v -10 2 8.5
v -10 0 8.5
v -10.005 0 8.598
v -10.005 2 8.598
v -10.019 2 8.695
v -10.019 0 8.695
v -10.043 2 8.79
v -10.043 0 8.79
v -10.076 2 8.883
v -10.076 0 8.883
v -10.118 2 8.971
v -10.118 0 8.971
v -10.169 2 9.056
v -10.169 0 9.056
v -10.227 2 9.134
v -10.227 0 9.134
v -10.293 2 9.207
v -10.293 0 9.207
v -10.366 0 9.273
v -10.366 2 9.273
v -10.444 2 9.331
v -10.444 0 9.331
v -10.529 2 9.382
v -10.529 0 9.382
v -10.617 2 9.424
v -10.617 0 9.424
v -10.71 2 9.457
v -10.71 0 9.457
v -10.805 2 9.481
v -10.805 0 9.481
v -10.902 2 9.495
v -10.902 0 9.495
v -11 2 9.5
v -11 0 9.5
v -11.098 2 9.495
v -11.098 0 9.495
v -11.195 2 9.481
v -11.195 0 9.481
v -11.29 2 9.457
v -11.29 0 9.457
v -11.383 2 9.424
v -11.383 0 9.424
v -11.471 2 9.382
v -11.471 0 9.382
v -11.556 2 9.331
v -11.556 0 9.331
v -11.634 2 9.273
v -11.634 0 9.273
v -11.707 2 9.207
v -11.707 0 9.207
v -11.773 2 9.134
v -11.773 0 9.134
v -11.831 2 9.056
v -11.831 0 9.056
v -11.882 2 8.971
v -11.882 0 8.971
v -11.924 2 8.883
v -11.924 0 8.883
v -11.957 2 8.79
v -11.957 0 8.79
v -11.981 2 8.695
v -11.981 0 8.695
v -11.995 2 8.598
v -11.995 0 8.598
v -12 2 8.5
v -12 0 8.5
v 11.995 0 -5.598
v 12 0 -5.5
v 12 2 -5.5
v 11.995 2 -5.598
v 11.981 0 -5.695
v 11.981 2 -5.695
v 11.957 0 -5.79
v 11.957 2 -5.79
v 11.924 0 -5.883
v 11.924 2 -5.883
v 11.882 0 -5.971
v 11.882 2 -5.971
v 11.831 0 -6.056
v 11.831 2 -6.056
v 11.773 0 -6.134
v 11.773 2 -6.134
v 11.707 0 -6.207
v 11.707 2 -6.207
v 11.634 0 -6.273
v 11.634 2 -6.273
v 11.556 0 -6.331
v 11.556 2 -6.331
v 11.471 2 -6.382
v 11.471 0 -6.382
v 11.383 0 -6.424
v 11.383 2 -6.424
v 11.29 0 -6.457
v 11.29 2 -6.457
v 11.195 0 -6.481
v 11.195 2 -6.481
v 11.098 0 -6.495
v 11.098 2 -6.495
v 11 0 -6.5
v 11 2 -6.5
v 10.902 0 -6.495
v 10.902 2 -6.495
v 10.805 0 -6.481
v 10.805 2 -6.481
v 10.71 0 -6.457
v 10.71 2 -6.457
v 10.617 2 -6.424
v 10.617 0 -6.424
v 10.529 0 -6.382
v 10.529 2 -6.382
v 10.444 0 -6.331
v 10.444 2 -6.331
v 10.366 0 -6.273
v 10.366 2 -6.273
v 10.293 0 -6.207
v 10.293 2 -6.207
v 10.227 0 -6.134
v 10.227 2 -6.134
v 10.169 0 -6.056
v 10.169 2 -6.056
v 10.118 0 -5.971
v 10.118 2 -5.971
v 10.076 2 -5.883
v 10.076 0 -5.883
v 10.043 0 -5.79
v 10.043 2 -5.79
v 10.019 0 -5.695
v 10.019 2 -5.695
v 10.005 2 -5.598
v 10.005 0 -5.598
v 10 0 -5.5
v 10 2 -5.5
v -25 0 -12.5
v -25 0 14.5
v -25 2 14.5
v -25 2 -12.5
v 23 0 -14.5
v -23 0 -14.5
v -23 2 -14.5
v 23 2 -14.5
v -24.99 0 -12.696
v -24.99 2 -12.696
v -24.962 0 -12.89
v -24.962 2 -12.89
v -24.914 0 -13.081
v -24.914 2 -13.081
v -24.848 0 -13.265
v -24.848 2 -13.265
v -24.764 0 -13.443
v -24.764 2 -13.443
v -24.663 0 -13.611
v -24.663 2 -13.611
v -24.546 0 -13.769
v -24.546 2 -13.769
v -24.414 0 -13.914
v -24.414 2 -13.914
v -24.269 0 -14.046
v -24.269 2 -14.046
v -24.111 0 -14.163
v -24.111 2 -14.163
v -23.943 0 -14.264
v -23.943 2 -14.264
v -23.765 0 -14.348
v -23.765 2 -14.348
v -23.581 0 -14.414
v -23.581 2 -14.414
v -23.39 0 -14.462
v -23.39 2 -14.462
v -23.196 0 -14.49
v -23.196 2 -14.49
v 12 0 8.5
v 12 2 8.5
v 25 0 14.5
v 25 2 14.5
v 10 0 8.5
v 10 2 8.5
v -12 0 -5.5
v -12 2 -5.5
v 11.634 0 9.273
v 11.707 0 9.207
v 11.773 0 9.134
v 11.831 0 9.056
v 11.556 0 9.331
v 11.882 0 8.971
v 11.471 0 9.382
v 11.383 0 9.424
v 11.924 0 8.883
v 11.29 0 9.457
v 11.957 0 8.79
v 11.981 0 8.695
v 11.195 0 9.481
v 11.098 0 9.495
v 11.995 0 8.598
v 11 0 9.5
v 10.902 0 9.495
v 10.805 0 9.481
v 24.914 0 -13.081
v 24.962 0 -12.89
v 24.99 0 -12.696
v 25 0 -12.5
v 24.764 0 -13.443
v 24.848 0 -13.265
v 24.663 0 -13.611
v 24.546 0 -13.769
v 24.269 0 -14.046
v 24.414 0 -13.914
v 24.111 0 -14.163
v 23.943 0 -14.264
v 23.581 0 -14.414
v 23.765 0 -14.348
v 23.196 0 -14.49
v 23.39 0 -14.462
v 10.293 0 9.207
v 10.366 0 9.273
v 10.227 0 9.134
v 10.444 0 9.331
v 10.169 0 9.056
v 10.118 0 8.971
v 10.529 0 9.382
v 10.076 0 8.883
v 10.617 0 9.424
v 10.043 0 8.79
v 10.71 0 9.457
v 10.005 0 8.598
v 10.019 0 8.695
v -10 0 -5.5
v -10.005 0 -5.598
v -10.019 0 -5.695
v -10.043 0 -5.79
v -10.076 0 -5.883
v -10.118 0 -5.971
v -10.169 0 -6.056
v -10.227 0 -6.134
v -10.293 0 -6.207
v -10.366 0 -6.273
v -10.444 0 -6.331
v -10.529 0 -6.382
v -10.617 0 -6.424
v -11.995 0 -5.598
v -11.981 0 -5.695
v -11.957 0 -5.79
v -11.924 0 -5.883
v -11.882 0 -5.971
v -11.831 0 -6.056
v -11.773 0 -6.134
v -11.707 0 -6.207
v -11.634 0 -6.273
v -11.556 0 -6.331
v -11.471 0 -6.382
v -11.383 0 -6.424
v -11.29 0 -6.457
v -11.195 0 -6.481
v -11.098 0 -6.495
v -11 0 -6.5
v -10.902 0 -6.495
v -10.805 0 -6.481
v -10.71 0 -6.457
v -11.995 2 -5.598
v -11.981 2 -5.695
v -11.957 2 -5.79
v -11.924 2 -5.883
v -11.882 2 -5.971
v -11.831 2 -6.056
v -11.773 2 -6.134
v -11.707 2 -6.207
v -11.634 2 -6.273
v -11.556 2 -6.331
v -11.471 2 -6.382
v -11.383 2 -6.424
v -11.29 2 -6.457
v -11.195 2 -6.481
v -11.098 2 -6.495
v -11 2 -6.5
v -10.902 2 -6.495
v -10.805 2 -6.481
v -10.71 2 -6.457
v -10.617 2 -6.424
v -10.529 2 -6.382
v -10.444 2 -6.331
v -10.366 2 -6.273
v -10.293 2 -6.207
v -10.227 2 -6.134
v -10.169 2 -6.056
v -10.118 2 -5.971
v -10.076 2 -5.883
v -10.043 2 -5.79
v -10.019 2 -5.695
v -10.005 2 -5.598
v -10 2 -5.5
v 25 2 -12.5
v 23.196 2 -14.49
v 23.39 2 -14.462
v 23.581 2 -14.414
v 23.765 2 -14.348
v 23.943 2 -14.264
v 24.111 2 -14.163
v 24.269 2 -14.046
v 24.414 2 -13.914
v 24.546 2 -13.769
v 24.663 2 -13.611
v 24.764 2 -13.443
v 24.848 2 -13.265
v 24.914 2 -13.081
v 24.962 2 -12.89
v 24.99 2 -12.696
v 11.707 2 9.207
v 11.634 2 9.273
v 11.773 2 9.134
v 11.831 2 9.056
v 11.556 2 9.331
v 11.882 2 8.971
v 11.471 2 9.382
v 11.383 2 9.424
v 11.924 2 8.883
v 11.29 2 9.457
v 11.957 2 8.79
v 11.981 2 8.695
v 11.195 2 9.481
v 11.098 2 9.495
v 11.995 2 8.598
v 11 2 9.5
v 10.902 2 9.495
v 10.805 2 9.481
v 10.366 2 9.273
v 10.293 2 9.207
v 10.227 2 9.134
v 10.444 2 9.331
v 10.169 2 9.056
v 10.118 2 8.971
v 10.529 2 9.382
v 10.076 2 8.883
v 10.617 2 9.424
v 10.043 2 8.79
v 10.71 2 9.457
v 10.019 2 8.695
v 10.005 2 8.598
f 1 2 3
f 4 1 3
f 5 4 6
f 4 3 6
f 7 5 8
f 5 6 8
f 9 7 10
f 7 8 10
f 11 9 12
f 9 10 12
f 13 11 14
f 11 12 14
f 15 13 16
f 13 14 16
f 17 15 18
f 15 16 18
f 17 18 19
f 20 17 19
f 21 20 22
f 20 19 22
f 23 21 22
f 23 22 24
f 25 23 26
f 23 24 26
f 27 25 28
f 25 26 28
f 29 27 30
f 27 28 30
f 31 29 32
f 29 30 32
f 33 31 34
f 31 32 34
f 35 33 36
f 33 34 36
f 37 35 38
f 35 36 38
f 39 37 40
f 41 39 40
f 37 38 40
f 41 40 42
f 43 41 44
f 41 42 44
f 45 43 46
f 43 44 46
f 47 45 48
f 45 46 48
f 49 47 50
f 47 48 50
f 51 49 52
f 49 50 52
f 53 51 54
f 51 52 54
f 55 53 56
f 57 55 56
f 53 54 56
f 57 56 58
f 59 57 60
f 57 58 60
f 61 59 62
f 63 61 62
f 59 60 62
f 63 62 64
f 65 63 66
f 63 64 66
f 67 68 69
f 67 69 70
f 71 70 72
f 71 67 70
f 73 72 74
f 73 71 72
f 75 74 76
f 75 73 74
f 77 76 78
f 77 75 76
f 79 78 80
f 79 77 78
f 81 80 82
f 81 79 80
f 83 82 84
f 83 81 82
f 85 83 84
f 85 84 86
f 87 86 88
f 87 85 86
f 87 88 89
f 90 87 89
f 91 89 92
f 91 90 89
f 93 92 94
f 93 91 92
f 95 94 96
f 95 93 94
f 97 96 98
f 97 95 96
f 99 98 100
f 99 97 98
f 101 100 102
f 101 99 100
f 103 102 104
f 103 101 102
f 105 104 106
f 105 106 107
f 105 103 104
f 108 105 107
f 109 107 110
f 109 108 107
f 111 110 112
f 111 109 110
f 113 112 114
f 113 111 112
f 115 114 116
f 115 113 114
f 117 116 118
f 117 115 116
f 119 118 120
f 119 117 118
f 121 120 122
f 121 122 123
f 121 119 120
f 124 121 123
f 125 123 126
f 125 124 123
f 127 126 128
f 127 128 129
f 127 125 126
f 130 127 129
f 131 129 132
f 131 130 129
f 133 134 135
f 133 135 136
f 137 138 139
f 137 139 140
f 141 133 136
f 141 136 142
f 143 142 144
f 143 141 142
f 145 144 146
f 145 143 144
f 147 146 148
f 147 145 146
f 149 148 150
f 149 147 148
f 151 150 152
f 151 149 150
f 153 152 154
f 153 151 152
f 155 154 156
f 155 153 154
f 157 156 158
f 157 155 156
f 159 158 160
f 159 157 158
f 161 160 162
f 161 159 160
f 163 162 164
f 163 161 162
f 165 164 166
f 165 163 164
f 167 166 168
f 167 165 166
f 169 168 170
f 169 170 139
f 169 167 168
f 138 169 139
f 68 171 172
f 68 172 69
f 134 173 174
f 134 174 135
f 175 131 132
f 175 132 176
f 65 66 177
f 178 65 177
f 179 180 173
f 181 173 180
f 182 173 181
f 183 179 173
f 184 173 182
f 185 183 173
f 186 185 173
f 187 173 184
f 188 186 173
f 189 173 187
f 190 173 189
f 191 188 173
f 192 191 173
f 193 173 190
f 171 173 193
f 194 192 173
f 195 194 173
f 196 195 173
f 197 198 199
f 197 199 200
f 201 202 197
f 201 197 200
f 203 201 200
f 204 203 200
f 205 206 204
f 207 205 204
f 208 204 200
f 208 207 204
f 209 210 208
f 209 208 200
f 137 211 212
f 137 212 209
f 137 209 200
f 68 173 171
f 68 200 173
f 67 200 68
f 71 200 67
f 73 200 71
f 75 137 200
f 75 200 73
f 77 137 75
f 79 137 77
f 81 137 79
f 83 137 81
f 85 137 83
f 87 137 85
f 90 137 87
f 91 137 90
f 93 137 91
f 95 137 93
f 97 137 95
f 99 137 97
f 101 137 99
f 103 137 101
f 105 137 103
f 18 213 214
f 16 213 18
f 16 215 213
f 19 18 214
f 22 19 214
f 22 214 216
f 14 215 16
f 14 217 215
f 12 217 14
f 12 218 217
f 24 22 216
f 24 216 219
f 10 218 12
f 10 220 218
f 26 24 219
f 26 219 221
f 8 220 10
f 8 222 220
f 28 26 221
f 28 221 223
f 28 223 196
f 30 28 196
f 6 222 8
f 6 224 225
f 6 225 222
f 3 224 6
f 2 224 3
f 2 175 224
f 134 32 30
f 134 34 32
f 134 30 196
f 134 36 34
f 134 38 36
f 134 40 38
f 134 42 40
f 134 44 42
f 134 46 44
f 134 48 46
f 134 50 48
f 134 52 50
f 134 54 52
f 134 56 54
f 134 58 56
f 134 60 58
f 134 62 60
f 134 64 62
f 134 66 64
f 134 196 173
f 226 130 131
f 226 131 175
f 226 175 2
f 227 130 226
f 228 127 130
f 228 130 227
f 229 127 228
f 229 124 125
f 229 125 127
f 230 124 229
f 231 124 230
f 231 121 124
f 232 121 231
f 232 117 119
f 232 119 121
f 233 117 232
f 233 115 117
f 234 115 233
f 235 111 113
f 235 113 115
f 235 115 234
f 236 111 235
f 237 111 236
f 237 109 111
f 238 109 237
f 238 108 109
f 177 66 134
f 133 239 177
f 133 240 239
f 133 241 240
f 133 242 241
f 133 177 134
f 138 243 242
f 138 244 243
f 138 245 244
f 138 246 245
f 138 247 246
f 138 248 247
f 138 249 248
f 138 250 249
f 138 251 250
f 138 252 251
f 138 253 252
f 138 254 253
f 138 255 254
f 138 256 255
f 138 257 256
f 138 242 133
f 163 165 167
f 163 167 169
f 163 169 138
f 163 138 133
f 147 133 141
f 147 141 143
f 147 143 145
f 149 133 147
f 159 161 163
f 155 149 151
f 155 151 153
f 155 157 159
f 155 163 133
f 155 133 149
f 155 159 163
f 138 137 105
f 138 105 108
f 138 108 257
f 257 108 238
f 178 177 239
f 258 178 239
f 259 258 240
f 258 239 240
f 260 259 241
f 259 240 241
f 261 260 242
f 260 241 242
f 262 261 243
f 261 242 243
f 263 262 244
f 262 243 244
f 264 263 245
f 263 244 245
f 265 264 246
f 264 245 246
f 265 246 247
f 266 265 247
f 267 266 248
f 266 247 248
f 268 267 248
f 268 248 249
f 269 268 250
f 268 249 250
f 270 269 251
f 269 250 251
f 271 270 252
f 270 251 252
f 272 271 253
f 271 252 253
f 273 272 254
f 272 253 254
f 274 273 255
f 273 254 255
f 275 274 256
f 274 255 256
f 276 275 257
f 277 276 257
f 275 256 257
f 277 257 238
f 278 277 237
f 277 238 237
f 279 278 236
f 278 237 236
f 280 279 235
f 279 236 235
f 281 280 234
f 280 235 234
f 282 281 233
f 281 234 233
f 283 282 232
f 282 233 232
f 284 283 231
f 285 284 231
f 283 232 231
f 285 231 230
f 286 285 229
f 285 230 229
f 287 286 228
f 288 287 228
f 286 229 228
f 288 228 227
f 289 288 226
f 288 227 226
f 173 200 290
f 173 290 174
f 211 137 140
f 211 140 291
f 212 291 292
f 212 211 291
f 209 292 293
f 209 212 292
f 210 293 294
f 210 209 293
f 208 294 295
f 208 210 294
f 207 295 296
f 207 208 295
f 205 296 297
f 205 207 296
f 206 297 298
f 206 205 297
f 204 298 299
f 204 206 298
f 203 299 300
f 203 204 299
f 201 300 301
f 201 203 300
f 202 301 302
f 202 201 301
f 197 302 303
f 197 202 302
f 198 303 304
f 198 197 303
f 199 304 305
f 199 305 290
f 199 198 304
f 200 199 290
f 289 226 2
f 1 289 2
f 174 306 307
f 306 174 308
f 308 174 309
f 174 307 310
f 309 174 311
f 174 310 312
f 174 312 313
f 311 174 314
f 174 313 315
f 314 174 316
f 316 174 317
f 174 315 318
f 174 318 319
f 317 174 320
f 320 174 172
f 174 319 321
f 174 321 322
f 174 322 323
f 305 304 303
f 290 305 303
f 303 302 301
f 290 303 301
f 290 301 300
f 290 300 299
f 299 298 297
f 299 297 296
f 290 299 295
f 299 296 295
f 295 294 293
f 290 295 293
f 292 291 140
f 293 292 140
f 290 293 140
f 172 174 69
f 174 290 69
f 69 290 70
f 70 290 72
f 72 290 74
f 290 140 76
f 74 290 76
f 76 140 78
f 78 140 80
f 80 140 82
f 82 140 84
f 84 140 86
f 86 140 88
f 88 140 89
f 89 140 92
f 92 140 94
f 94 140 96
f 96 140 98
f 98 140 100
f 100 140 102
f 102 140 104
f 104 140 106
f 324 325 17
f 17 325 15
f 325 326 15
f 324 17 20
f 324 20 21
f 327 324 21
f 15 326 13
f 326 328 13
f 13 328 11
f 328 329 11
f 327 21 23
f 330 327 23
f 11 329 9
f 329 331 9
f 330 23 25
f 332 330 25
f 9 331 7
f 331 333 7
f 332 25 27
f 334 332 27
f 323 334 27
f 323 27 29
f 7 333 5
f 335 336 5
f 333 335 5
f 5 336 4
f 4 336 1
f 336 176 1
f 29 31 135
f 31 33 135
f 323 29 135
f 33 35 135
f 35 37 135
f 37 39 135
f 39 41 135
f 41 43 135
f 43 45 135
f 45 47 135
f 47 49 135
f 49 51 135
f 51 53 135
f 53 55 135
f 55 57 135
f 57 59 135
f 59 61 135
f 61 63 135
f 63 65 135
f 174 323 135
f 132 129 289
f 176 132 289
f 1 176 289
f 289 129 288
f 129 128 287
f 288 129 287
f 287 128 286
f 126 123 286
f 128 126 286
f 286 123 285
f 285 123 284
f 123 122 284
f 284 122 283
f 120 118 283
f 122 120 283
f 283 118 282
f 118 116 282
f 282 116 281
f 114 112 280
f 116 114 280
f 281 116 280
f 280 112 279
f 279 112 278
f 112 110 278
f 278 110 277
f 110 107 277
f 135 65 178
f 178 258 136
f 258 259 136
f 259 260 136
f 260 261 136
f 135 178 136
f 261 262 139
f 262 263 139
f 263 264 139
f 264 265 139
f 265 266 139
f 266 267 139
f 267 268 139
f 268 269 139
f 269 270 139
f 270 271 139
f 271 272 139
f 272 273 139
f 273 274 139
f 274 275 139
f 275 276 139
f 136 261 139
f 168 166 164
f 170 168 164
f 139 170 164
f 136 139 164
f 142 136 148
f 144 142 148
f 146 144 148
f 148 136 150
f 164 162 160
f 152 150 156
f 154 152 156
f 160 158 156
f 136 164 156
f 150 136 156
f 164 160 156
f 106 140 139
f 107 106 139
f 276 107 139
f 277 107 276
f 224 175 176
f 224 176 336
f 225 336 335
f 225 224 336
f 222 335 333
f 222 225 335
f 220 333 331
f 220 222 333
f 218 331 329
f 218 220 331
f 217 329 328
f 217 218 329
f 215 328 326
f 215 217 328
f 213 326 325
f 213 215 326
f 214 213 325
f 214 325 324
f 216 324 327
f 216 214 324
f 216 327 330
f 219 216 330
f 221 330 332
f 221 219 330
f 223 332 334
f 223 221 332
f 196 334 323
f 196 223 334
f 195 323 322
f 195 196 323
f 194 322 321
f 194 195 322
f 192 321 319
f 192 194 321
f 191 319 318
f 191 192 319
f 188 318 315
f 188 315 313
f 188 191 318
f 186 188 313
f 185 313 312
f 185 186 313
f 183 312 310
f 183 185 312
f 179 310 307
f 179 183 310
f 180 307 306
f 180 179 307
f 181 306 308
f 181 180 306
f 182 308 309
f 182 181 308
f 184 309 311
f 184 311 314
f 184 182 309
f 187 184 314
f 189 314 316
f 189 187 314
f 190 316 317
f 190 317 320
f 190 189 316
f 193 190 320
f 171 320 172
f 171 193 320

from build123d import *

# Parameters (mm, degrees)
RESSALTO_EXTRUS_O1_DEPTH = 2


with BuildPart() as part:
    # Esboço1 → Ressalto-extrusão1 (new body)
    with BuildSketch(Plane(origin=(0, 0, 0), x_dir=(1, 0, 0), z_dir=(0, 1, 0))):
        with BuildLine():
            Line((-23, 14.5), (23, 14.5))
            ThreePointArc((23, 14.5), (24.414213562, 13.914213562), (25, 12.5))
            Line((25, 12.5), (25, -14.5))
            Line((25, -14.5), (-25, -14.5))
            Line((-25, -14.5), (-25, 12.5))
            ThreePointArc((-25, 12.5), (-24.414213562, 13.914213562), (-23, 14.5))
        make_face()
        with BuildLine():
            Line((-10, 5.5), (-10, -8.5))
            ThreePointArc((-10, -8.5), (-11, -9.5), (-12, -8.5))
            Line((-12, -8.5), (-12, 5.5))
            ThreePointArc((-12, 5.5), (-11, 6.5), (-10, 5.5))
        make_face(mode=Mode.SUBTRACT)
        with BuildLine():
            Line((10, 5.5), (10, -8.5))
            ThreePointArc((10, -8.5), (11, -9.5), (12, -8.5))
            Line((12, -8.5), (12, 5.5))
            ThreePointArc((12, 5.5), (11, 6.5), (10, 5.5))
        make_face(mode=Mode.SUBTRACT)
    extrude(amount=RESSALTO_EXTRUS_O1_DEPTH)


solid = part.part
